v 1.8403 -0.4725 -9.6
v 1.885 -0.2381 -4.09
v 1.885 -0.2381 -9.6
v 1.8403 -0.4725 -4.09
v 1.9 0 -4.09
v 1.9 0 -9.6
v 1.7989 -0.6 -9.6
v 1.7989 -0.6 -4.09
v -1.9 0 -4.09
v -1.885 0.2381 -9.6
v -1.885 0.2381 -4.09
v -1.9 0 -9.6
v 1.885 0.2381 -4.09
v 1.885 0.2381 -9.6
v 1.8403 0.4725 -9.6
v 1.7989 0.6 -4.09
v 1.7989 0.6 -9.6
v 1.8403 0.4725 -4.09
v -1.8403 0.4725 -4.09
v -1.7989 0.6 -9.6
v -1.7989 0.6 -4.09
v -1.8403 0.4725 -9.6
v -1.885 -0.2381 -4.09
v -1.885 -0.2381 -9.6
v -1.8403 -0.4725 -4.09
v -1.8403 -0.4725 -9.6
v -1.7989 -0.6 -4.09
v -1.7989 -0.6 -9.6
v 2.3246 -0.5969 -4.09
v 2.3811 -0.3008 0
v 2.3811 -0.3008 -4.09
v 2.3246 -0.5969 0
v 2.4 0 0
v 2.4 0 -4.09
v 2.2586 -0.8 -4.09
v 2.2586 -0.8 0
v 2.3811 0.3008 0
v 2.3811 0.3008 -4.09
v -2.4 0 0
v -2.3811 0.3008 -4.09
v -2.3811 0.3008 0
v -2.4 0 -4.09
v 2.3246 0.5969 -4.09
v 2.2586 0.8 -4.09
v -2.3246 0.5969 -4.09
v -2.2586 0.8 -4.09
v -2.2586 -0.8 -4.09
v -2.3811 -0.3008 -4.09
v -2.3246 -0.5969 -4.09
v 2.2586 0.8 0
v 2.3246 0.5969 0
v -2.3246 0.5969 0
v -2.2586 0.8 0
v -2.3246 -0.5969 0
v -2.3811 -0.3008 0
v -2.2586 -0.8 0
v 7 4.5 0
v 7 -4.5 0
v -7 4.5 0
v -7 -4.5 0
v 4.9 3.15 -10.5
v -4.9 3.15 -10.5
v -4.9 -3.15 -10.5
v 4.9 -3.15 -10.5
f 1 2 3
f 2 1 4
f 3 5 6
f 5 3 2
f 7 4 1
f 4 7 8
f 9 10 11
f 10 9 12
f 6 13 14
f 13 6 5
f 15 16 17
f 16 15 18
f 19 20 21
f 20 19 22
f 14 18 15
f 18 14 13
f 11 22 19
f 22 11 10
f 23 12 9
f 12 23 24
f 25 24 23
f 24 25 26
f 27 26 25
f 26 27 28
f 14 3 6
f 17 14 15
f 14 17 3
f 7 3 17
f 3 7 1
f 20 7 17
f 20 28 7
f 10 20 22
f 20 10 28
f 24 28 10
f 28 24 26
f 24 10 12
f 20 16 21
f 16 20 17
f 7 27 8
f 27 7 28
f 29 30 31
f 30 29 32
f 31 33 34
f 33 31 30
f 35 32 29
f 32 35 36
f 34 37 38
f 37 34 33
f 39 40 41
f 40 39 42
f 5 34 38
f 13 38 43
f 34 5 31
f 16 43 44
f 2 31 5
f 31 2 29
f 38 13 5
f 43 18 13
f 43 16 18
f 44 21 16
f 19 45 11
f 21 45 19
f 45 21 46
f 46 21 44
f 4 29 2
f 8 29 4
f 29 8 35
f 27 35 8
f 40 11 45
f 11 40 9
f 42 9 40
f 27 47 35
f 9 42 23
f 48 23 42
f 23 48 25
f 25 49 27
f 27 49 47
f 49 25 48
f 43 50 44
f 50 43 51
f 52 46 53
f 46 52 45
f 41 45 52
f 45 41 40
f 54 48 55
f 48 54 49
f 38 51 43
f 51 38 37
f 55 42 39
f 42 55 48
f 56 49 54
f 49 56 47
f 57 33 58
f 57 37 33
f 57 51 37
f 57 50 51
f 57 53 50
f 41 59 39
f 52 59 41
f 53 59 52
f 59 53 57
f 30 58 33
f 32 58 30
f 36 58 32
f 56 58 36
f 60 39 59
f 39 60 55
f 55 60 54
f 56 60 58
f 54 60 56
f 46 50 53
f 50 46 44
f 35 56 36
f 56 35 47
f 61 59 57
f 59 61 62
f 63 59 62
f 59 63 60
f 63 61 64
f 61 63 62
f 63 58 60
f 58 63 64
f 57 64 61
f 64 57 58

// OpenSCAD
/* [Basic] */
//Diametre du bouton
//Knob_Diameter=10; //[10:30]
Fader_Width=14; //[10:30]
Fader_Length=9; //[10:30]
//Hauteur du bouton
Knob_Height=12;//[10:20]
//Longueur de l'axe
Axis_Lenght=9.6;//[5:15]
Axis_Width = 0.8 ;
FaderAxis_Length = 4.2;
//Arrondis
Rounded=1.5;//[1:3]
//Ajustement
Ajustment=-0.2;//[0,0.1,0.2,0.3]
/* [Hidden] */
$fn=50;



rotate([180,0,0]) difference() {
  union() {
      //cylinder(r1=Knob_Diameter/2+1.6, r2=Knob_Diameter/2,h=Knob_Height-Rounded);
      //translate([-Fader_Length/2,-Fader_Width/2,0]) cube([Fader_Length,Fader_Width,Knob_Height-Rounded]);
      rotate([0,0,90]) linear_extrude(height = Knob_Height-Rounded, center = false, convexity = 10, scale=0.7) square([Fader_Length,Fader_Width],true);
      //translate([0,0,Knob_Height-Rounded]) cylinder(r=Fader_Width/2-Rounded,h=Rounded);
      //translate([0,0,Knob_Height-Rounded]) rotate_extrude(convexity = 10) translate([Fader_Width/2-Rounded,0,0])  circle(r=Rounded);
  }
  /*
  translate([0,-Fader_Width/2,Knob_Height-2*Rounded]) rotate([-90,0,0]) scale([1, 1, 1]) cylinder(r=1,h=Fader_Width);
  translate([0,-Fader_Width/2,Knob_Height-Rounded]) rotate([-90,0,0]) scale([Fader_Length/2, 2, 1]) cylinder(r=1,h=Fader_Width);
  translate([Fader_Length/3,-Fader_Width/2,Knob_Height-Rounded-1]) rotate([-90,0,0]) scale([2, 1, 1]) cylinder(r=Rounded,h=Fader_Width);
  translate([-Fader_Length/3,-Fader_Width/2,Knob_Height-Rounded-1]) rotate([-90,0,0]) scale([2, 1, 1]) cylinder(r=Rounded,h=Fader_Width);
*/
  difference() {
      translate([0,0,4]) cylinder(r=FaderAxis_Length/2+Ajustment,h=Axis_Lenght-4);
      translate([-5,-6-Axis_Width-Ajustment,2]) cube([10,6,Axis_Lenght-2]);
      translate([-5, Axis_Width+Ajustment,2]) cube([10,6,Axis_Lenght-2]);
  }
  difference() {
      translate([0,0,-0.01]) cylinder(r=FaderAxis_Length/2+Ajustment+0.5,h=4.1);
      #translate([-5,-6-Axis_Width-0.2-Ajustment,0]) cube([10,6,Axis_Lenght-2]);
      #translate([-5, Axis_Width+0.2+Ajustment,0]) cube([10,5,Axis_Lenght-2]);
  }
}
